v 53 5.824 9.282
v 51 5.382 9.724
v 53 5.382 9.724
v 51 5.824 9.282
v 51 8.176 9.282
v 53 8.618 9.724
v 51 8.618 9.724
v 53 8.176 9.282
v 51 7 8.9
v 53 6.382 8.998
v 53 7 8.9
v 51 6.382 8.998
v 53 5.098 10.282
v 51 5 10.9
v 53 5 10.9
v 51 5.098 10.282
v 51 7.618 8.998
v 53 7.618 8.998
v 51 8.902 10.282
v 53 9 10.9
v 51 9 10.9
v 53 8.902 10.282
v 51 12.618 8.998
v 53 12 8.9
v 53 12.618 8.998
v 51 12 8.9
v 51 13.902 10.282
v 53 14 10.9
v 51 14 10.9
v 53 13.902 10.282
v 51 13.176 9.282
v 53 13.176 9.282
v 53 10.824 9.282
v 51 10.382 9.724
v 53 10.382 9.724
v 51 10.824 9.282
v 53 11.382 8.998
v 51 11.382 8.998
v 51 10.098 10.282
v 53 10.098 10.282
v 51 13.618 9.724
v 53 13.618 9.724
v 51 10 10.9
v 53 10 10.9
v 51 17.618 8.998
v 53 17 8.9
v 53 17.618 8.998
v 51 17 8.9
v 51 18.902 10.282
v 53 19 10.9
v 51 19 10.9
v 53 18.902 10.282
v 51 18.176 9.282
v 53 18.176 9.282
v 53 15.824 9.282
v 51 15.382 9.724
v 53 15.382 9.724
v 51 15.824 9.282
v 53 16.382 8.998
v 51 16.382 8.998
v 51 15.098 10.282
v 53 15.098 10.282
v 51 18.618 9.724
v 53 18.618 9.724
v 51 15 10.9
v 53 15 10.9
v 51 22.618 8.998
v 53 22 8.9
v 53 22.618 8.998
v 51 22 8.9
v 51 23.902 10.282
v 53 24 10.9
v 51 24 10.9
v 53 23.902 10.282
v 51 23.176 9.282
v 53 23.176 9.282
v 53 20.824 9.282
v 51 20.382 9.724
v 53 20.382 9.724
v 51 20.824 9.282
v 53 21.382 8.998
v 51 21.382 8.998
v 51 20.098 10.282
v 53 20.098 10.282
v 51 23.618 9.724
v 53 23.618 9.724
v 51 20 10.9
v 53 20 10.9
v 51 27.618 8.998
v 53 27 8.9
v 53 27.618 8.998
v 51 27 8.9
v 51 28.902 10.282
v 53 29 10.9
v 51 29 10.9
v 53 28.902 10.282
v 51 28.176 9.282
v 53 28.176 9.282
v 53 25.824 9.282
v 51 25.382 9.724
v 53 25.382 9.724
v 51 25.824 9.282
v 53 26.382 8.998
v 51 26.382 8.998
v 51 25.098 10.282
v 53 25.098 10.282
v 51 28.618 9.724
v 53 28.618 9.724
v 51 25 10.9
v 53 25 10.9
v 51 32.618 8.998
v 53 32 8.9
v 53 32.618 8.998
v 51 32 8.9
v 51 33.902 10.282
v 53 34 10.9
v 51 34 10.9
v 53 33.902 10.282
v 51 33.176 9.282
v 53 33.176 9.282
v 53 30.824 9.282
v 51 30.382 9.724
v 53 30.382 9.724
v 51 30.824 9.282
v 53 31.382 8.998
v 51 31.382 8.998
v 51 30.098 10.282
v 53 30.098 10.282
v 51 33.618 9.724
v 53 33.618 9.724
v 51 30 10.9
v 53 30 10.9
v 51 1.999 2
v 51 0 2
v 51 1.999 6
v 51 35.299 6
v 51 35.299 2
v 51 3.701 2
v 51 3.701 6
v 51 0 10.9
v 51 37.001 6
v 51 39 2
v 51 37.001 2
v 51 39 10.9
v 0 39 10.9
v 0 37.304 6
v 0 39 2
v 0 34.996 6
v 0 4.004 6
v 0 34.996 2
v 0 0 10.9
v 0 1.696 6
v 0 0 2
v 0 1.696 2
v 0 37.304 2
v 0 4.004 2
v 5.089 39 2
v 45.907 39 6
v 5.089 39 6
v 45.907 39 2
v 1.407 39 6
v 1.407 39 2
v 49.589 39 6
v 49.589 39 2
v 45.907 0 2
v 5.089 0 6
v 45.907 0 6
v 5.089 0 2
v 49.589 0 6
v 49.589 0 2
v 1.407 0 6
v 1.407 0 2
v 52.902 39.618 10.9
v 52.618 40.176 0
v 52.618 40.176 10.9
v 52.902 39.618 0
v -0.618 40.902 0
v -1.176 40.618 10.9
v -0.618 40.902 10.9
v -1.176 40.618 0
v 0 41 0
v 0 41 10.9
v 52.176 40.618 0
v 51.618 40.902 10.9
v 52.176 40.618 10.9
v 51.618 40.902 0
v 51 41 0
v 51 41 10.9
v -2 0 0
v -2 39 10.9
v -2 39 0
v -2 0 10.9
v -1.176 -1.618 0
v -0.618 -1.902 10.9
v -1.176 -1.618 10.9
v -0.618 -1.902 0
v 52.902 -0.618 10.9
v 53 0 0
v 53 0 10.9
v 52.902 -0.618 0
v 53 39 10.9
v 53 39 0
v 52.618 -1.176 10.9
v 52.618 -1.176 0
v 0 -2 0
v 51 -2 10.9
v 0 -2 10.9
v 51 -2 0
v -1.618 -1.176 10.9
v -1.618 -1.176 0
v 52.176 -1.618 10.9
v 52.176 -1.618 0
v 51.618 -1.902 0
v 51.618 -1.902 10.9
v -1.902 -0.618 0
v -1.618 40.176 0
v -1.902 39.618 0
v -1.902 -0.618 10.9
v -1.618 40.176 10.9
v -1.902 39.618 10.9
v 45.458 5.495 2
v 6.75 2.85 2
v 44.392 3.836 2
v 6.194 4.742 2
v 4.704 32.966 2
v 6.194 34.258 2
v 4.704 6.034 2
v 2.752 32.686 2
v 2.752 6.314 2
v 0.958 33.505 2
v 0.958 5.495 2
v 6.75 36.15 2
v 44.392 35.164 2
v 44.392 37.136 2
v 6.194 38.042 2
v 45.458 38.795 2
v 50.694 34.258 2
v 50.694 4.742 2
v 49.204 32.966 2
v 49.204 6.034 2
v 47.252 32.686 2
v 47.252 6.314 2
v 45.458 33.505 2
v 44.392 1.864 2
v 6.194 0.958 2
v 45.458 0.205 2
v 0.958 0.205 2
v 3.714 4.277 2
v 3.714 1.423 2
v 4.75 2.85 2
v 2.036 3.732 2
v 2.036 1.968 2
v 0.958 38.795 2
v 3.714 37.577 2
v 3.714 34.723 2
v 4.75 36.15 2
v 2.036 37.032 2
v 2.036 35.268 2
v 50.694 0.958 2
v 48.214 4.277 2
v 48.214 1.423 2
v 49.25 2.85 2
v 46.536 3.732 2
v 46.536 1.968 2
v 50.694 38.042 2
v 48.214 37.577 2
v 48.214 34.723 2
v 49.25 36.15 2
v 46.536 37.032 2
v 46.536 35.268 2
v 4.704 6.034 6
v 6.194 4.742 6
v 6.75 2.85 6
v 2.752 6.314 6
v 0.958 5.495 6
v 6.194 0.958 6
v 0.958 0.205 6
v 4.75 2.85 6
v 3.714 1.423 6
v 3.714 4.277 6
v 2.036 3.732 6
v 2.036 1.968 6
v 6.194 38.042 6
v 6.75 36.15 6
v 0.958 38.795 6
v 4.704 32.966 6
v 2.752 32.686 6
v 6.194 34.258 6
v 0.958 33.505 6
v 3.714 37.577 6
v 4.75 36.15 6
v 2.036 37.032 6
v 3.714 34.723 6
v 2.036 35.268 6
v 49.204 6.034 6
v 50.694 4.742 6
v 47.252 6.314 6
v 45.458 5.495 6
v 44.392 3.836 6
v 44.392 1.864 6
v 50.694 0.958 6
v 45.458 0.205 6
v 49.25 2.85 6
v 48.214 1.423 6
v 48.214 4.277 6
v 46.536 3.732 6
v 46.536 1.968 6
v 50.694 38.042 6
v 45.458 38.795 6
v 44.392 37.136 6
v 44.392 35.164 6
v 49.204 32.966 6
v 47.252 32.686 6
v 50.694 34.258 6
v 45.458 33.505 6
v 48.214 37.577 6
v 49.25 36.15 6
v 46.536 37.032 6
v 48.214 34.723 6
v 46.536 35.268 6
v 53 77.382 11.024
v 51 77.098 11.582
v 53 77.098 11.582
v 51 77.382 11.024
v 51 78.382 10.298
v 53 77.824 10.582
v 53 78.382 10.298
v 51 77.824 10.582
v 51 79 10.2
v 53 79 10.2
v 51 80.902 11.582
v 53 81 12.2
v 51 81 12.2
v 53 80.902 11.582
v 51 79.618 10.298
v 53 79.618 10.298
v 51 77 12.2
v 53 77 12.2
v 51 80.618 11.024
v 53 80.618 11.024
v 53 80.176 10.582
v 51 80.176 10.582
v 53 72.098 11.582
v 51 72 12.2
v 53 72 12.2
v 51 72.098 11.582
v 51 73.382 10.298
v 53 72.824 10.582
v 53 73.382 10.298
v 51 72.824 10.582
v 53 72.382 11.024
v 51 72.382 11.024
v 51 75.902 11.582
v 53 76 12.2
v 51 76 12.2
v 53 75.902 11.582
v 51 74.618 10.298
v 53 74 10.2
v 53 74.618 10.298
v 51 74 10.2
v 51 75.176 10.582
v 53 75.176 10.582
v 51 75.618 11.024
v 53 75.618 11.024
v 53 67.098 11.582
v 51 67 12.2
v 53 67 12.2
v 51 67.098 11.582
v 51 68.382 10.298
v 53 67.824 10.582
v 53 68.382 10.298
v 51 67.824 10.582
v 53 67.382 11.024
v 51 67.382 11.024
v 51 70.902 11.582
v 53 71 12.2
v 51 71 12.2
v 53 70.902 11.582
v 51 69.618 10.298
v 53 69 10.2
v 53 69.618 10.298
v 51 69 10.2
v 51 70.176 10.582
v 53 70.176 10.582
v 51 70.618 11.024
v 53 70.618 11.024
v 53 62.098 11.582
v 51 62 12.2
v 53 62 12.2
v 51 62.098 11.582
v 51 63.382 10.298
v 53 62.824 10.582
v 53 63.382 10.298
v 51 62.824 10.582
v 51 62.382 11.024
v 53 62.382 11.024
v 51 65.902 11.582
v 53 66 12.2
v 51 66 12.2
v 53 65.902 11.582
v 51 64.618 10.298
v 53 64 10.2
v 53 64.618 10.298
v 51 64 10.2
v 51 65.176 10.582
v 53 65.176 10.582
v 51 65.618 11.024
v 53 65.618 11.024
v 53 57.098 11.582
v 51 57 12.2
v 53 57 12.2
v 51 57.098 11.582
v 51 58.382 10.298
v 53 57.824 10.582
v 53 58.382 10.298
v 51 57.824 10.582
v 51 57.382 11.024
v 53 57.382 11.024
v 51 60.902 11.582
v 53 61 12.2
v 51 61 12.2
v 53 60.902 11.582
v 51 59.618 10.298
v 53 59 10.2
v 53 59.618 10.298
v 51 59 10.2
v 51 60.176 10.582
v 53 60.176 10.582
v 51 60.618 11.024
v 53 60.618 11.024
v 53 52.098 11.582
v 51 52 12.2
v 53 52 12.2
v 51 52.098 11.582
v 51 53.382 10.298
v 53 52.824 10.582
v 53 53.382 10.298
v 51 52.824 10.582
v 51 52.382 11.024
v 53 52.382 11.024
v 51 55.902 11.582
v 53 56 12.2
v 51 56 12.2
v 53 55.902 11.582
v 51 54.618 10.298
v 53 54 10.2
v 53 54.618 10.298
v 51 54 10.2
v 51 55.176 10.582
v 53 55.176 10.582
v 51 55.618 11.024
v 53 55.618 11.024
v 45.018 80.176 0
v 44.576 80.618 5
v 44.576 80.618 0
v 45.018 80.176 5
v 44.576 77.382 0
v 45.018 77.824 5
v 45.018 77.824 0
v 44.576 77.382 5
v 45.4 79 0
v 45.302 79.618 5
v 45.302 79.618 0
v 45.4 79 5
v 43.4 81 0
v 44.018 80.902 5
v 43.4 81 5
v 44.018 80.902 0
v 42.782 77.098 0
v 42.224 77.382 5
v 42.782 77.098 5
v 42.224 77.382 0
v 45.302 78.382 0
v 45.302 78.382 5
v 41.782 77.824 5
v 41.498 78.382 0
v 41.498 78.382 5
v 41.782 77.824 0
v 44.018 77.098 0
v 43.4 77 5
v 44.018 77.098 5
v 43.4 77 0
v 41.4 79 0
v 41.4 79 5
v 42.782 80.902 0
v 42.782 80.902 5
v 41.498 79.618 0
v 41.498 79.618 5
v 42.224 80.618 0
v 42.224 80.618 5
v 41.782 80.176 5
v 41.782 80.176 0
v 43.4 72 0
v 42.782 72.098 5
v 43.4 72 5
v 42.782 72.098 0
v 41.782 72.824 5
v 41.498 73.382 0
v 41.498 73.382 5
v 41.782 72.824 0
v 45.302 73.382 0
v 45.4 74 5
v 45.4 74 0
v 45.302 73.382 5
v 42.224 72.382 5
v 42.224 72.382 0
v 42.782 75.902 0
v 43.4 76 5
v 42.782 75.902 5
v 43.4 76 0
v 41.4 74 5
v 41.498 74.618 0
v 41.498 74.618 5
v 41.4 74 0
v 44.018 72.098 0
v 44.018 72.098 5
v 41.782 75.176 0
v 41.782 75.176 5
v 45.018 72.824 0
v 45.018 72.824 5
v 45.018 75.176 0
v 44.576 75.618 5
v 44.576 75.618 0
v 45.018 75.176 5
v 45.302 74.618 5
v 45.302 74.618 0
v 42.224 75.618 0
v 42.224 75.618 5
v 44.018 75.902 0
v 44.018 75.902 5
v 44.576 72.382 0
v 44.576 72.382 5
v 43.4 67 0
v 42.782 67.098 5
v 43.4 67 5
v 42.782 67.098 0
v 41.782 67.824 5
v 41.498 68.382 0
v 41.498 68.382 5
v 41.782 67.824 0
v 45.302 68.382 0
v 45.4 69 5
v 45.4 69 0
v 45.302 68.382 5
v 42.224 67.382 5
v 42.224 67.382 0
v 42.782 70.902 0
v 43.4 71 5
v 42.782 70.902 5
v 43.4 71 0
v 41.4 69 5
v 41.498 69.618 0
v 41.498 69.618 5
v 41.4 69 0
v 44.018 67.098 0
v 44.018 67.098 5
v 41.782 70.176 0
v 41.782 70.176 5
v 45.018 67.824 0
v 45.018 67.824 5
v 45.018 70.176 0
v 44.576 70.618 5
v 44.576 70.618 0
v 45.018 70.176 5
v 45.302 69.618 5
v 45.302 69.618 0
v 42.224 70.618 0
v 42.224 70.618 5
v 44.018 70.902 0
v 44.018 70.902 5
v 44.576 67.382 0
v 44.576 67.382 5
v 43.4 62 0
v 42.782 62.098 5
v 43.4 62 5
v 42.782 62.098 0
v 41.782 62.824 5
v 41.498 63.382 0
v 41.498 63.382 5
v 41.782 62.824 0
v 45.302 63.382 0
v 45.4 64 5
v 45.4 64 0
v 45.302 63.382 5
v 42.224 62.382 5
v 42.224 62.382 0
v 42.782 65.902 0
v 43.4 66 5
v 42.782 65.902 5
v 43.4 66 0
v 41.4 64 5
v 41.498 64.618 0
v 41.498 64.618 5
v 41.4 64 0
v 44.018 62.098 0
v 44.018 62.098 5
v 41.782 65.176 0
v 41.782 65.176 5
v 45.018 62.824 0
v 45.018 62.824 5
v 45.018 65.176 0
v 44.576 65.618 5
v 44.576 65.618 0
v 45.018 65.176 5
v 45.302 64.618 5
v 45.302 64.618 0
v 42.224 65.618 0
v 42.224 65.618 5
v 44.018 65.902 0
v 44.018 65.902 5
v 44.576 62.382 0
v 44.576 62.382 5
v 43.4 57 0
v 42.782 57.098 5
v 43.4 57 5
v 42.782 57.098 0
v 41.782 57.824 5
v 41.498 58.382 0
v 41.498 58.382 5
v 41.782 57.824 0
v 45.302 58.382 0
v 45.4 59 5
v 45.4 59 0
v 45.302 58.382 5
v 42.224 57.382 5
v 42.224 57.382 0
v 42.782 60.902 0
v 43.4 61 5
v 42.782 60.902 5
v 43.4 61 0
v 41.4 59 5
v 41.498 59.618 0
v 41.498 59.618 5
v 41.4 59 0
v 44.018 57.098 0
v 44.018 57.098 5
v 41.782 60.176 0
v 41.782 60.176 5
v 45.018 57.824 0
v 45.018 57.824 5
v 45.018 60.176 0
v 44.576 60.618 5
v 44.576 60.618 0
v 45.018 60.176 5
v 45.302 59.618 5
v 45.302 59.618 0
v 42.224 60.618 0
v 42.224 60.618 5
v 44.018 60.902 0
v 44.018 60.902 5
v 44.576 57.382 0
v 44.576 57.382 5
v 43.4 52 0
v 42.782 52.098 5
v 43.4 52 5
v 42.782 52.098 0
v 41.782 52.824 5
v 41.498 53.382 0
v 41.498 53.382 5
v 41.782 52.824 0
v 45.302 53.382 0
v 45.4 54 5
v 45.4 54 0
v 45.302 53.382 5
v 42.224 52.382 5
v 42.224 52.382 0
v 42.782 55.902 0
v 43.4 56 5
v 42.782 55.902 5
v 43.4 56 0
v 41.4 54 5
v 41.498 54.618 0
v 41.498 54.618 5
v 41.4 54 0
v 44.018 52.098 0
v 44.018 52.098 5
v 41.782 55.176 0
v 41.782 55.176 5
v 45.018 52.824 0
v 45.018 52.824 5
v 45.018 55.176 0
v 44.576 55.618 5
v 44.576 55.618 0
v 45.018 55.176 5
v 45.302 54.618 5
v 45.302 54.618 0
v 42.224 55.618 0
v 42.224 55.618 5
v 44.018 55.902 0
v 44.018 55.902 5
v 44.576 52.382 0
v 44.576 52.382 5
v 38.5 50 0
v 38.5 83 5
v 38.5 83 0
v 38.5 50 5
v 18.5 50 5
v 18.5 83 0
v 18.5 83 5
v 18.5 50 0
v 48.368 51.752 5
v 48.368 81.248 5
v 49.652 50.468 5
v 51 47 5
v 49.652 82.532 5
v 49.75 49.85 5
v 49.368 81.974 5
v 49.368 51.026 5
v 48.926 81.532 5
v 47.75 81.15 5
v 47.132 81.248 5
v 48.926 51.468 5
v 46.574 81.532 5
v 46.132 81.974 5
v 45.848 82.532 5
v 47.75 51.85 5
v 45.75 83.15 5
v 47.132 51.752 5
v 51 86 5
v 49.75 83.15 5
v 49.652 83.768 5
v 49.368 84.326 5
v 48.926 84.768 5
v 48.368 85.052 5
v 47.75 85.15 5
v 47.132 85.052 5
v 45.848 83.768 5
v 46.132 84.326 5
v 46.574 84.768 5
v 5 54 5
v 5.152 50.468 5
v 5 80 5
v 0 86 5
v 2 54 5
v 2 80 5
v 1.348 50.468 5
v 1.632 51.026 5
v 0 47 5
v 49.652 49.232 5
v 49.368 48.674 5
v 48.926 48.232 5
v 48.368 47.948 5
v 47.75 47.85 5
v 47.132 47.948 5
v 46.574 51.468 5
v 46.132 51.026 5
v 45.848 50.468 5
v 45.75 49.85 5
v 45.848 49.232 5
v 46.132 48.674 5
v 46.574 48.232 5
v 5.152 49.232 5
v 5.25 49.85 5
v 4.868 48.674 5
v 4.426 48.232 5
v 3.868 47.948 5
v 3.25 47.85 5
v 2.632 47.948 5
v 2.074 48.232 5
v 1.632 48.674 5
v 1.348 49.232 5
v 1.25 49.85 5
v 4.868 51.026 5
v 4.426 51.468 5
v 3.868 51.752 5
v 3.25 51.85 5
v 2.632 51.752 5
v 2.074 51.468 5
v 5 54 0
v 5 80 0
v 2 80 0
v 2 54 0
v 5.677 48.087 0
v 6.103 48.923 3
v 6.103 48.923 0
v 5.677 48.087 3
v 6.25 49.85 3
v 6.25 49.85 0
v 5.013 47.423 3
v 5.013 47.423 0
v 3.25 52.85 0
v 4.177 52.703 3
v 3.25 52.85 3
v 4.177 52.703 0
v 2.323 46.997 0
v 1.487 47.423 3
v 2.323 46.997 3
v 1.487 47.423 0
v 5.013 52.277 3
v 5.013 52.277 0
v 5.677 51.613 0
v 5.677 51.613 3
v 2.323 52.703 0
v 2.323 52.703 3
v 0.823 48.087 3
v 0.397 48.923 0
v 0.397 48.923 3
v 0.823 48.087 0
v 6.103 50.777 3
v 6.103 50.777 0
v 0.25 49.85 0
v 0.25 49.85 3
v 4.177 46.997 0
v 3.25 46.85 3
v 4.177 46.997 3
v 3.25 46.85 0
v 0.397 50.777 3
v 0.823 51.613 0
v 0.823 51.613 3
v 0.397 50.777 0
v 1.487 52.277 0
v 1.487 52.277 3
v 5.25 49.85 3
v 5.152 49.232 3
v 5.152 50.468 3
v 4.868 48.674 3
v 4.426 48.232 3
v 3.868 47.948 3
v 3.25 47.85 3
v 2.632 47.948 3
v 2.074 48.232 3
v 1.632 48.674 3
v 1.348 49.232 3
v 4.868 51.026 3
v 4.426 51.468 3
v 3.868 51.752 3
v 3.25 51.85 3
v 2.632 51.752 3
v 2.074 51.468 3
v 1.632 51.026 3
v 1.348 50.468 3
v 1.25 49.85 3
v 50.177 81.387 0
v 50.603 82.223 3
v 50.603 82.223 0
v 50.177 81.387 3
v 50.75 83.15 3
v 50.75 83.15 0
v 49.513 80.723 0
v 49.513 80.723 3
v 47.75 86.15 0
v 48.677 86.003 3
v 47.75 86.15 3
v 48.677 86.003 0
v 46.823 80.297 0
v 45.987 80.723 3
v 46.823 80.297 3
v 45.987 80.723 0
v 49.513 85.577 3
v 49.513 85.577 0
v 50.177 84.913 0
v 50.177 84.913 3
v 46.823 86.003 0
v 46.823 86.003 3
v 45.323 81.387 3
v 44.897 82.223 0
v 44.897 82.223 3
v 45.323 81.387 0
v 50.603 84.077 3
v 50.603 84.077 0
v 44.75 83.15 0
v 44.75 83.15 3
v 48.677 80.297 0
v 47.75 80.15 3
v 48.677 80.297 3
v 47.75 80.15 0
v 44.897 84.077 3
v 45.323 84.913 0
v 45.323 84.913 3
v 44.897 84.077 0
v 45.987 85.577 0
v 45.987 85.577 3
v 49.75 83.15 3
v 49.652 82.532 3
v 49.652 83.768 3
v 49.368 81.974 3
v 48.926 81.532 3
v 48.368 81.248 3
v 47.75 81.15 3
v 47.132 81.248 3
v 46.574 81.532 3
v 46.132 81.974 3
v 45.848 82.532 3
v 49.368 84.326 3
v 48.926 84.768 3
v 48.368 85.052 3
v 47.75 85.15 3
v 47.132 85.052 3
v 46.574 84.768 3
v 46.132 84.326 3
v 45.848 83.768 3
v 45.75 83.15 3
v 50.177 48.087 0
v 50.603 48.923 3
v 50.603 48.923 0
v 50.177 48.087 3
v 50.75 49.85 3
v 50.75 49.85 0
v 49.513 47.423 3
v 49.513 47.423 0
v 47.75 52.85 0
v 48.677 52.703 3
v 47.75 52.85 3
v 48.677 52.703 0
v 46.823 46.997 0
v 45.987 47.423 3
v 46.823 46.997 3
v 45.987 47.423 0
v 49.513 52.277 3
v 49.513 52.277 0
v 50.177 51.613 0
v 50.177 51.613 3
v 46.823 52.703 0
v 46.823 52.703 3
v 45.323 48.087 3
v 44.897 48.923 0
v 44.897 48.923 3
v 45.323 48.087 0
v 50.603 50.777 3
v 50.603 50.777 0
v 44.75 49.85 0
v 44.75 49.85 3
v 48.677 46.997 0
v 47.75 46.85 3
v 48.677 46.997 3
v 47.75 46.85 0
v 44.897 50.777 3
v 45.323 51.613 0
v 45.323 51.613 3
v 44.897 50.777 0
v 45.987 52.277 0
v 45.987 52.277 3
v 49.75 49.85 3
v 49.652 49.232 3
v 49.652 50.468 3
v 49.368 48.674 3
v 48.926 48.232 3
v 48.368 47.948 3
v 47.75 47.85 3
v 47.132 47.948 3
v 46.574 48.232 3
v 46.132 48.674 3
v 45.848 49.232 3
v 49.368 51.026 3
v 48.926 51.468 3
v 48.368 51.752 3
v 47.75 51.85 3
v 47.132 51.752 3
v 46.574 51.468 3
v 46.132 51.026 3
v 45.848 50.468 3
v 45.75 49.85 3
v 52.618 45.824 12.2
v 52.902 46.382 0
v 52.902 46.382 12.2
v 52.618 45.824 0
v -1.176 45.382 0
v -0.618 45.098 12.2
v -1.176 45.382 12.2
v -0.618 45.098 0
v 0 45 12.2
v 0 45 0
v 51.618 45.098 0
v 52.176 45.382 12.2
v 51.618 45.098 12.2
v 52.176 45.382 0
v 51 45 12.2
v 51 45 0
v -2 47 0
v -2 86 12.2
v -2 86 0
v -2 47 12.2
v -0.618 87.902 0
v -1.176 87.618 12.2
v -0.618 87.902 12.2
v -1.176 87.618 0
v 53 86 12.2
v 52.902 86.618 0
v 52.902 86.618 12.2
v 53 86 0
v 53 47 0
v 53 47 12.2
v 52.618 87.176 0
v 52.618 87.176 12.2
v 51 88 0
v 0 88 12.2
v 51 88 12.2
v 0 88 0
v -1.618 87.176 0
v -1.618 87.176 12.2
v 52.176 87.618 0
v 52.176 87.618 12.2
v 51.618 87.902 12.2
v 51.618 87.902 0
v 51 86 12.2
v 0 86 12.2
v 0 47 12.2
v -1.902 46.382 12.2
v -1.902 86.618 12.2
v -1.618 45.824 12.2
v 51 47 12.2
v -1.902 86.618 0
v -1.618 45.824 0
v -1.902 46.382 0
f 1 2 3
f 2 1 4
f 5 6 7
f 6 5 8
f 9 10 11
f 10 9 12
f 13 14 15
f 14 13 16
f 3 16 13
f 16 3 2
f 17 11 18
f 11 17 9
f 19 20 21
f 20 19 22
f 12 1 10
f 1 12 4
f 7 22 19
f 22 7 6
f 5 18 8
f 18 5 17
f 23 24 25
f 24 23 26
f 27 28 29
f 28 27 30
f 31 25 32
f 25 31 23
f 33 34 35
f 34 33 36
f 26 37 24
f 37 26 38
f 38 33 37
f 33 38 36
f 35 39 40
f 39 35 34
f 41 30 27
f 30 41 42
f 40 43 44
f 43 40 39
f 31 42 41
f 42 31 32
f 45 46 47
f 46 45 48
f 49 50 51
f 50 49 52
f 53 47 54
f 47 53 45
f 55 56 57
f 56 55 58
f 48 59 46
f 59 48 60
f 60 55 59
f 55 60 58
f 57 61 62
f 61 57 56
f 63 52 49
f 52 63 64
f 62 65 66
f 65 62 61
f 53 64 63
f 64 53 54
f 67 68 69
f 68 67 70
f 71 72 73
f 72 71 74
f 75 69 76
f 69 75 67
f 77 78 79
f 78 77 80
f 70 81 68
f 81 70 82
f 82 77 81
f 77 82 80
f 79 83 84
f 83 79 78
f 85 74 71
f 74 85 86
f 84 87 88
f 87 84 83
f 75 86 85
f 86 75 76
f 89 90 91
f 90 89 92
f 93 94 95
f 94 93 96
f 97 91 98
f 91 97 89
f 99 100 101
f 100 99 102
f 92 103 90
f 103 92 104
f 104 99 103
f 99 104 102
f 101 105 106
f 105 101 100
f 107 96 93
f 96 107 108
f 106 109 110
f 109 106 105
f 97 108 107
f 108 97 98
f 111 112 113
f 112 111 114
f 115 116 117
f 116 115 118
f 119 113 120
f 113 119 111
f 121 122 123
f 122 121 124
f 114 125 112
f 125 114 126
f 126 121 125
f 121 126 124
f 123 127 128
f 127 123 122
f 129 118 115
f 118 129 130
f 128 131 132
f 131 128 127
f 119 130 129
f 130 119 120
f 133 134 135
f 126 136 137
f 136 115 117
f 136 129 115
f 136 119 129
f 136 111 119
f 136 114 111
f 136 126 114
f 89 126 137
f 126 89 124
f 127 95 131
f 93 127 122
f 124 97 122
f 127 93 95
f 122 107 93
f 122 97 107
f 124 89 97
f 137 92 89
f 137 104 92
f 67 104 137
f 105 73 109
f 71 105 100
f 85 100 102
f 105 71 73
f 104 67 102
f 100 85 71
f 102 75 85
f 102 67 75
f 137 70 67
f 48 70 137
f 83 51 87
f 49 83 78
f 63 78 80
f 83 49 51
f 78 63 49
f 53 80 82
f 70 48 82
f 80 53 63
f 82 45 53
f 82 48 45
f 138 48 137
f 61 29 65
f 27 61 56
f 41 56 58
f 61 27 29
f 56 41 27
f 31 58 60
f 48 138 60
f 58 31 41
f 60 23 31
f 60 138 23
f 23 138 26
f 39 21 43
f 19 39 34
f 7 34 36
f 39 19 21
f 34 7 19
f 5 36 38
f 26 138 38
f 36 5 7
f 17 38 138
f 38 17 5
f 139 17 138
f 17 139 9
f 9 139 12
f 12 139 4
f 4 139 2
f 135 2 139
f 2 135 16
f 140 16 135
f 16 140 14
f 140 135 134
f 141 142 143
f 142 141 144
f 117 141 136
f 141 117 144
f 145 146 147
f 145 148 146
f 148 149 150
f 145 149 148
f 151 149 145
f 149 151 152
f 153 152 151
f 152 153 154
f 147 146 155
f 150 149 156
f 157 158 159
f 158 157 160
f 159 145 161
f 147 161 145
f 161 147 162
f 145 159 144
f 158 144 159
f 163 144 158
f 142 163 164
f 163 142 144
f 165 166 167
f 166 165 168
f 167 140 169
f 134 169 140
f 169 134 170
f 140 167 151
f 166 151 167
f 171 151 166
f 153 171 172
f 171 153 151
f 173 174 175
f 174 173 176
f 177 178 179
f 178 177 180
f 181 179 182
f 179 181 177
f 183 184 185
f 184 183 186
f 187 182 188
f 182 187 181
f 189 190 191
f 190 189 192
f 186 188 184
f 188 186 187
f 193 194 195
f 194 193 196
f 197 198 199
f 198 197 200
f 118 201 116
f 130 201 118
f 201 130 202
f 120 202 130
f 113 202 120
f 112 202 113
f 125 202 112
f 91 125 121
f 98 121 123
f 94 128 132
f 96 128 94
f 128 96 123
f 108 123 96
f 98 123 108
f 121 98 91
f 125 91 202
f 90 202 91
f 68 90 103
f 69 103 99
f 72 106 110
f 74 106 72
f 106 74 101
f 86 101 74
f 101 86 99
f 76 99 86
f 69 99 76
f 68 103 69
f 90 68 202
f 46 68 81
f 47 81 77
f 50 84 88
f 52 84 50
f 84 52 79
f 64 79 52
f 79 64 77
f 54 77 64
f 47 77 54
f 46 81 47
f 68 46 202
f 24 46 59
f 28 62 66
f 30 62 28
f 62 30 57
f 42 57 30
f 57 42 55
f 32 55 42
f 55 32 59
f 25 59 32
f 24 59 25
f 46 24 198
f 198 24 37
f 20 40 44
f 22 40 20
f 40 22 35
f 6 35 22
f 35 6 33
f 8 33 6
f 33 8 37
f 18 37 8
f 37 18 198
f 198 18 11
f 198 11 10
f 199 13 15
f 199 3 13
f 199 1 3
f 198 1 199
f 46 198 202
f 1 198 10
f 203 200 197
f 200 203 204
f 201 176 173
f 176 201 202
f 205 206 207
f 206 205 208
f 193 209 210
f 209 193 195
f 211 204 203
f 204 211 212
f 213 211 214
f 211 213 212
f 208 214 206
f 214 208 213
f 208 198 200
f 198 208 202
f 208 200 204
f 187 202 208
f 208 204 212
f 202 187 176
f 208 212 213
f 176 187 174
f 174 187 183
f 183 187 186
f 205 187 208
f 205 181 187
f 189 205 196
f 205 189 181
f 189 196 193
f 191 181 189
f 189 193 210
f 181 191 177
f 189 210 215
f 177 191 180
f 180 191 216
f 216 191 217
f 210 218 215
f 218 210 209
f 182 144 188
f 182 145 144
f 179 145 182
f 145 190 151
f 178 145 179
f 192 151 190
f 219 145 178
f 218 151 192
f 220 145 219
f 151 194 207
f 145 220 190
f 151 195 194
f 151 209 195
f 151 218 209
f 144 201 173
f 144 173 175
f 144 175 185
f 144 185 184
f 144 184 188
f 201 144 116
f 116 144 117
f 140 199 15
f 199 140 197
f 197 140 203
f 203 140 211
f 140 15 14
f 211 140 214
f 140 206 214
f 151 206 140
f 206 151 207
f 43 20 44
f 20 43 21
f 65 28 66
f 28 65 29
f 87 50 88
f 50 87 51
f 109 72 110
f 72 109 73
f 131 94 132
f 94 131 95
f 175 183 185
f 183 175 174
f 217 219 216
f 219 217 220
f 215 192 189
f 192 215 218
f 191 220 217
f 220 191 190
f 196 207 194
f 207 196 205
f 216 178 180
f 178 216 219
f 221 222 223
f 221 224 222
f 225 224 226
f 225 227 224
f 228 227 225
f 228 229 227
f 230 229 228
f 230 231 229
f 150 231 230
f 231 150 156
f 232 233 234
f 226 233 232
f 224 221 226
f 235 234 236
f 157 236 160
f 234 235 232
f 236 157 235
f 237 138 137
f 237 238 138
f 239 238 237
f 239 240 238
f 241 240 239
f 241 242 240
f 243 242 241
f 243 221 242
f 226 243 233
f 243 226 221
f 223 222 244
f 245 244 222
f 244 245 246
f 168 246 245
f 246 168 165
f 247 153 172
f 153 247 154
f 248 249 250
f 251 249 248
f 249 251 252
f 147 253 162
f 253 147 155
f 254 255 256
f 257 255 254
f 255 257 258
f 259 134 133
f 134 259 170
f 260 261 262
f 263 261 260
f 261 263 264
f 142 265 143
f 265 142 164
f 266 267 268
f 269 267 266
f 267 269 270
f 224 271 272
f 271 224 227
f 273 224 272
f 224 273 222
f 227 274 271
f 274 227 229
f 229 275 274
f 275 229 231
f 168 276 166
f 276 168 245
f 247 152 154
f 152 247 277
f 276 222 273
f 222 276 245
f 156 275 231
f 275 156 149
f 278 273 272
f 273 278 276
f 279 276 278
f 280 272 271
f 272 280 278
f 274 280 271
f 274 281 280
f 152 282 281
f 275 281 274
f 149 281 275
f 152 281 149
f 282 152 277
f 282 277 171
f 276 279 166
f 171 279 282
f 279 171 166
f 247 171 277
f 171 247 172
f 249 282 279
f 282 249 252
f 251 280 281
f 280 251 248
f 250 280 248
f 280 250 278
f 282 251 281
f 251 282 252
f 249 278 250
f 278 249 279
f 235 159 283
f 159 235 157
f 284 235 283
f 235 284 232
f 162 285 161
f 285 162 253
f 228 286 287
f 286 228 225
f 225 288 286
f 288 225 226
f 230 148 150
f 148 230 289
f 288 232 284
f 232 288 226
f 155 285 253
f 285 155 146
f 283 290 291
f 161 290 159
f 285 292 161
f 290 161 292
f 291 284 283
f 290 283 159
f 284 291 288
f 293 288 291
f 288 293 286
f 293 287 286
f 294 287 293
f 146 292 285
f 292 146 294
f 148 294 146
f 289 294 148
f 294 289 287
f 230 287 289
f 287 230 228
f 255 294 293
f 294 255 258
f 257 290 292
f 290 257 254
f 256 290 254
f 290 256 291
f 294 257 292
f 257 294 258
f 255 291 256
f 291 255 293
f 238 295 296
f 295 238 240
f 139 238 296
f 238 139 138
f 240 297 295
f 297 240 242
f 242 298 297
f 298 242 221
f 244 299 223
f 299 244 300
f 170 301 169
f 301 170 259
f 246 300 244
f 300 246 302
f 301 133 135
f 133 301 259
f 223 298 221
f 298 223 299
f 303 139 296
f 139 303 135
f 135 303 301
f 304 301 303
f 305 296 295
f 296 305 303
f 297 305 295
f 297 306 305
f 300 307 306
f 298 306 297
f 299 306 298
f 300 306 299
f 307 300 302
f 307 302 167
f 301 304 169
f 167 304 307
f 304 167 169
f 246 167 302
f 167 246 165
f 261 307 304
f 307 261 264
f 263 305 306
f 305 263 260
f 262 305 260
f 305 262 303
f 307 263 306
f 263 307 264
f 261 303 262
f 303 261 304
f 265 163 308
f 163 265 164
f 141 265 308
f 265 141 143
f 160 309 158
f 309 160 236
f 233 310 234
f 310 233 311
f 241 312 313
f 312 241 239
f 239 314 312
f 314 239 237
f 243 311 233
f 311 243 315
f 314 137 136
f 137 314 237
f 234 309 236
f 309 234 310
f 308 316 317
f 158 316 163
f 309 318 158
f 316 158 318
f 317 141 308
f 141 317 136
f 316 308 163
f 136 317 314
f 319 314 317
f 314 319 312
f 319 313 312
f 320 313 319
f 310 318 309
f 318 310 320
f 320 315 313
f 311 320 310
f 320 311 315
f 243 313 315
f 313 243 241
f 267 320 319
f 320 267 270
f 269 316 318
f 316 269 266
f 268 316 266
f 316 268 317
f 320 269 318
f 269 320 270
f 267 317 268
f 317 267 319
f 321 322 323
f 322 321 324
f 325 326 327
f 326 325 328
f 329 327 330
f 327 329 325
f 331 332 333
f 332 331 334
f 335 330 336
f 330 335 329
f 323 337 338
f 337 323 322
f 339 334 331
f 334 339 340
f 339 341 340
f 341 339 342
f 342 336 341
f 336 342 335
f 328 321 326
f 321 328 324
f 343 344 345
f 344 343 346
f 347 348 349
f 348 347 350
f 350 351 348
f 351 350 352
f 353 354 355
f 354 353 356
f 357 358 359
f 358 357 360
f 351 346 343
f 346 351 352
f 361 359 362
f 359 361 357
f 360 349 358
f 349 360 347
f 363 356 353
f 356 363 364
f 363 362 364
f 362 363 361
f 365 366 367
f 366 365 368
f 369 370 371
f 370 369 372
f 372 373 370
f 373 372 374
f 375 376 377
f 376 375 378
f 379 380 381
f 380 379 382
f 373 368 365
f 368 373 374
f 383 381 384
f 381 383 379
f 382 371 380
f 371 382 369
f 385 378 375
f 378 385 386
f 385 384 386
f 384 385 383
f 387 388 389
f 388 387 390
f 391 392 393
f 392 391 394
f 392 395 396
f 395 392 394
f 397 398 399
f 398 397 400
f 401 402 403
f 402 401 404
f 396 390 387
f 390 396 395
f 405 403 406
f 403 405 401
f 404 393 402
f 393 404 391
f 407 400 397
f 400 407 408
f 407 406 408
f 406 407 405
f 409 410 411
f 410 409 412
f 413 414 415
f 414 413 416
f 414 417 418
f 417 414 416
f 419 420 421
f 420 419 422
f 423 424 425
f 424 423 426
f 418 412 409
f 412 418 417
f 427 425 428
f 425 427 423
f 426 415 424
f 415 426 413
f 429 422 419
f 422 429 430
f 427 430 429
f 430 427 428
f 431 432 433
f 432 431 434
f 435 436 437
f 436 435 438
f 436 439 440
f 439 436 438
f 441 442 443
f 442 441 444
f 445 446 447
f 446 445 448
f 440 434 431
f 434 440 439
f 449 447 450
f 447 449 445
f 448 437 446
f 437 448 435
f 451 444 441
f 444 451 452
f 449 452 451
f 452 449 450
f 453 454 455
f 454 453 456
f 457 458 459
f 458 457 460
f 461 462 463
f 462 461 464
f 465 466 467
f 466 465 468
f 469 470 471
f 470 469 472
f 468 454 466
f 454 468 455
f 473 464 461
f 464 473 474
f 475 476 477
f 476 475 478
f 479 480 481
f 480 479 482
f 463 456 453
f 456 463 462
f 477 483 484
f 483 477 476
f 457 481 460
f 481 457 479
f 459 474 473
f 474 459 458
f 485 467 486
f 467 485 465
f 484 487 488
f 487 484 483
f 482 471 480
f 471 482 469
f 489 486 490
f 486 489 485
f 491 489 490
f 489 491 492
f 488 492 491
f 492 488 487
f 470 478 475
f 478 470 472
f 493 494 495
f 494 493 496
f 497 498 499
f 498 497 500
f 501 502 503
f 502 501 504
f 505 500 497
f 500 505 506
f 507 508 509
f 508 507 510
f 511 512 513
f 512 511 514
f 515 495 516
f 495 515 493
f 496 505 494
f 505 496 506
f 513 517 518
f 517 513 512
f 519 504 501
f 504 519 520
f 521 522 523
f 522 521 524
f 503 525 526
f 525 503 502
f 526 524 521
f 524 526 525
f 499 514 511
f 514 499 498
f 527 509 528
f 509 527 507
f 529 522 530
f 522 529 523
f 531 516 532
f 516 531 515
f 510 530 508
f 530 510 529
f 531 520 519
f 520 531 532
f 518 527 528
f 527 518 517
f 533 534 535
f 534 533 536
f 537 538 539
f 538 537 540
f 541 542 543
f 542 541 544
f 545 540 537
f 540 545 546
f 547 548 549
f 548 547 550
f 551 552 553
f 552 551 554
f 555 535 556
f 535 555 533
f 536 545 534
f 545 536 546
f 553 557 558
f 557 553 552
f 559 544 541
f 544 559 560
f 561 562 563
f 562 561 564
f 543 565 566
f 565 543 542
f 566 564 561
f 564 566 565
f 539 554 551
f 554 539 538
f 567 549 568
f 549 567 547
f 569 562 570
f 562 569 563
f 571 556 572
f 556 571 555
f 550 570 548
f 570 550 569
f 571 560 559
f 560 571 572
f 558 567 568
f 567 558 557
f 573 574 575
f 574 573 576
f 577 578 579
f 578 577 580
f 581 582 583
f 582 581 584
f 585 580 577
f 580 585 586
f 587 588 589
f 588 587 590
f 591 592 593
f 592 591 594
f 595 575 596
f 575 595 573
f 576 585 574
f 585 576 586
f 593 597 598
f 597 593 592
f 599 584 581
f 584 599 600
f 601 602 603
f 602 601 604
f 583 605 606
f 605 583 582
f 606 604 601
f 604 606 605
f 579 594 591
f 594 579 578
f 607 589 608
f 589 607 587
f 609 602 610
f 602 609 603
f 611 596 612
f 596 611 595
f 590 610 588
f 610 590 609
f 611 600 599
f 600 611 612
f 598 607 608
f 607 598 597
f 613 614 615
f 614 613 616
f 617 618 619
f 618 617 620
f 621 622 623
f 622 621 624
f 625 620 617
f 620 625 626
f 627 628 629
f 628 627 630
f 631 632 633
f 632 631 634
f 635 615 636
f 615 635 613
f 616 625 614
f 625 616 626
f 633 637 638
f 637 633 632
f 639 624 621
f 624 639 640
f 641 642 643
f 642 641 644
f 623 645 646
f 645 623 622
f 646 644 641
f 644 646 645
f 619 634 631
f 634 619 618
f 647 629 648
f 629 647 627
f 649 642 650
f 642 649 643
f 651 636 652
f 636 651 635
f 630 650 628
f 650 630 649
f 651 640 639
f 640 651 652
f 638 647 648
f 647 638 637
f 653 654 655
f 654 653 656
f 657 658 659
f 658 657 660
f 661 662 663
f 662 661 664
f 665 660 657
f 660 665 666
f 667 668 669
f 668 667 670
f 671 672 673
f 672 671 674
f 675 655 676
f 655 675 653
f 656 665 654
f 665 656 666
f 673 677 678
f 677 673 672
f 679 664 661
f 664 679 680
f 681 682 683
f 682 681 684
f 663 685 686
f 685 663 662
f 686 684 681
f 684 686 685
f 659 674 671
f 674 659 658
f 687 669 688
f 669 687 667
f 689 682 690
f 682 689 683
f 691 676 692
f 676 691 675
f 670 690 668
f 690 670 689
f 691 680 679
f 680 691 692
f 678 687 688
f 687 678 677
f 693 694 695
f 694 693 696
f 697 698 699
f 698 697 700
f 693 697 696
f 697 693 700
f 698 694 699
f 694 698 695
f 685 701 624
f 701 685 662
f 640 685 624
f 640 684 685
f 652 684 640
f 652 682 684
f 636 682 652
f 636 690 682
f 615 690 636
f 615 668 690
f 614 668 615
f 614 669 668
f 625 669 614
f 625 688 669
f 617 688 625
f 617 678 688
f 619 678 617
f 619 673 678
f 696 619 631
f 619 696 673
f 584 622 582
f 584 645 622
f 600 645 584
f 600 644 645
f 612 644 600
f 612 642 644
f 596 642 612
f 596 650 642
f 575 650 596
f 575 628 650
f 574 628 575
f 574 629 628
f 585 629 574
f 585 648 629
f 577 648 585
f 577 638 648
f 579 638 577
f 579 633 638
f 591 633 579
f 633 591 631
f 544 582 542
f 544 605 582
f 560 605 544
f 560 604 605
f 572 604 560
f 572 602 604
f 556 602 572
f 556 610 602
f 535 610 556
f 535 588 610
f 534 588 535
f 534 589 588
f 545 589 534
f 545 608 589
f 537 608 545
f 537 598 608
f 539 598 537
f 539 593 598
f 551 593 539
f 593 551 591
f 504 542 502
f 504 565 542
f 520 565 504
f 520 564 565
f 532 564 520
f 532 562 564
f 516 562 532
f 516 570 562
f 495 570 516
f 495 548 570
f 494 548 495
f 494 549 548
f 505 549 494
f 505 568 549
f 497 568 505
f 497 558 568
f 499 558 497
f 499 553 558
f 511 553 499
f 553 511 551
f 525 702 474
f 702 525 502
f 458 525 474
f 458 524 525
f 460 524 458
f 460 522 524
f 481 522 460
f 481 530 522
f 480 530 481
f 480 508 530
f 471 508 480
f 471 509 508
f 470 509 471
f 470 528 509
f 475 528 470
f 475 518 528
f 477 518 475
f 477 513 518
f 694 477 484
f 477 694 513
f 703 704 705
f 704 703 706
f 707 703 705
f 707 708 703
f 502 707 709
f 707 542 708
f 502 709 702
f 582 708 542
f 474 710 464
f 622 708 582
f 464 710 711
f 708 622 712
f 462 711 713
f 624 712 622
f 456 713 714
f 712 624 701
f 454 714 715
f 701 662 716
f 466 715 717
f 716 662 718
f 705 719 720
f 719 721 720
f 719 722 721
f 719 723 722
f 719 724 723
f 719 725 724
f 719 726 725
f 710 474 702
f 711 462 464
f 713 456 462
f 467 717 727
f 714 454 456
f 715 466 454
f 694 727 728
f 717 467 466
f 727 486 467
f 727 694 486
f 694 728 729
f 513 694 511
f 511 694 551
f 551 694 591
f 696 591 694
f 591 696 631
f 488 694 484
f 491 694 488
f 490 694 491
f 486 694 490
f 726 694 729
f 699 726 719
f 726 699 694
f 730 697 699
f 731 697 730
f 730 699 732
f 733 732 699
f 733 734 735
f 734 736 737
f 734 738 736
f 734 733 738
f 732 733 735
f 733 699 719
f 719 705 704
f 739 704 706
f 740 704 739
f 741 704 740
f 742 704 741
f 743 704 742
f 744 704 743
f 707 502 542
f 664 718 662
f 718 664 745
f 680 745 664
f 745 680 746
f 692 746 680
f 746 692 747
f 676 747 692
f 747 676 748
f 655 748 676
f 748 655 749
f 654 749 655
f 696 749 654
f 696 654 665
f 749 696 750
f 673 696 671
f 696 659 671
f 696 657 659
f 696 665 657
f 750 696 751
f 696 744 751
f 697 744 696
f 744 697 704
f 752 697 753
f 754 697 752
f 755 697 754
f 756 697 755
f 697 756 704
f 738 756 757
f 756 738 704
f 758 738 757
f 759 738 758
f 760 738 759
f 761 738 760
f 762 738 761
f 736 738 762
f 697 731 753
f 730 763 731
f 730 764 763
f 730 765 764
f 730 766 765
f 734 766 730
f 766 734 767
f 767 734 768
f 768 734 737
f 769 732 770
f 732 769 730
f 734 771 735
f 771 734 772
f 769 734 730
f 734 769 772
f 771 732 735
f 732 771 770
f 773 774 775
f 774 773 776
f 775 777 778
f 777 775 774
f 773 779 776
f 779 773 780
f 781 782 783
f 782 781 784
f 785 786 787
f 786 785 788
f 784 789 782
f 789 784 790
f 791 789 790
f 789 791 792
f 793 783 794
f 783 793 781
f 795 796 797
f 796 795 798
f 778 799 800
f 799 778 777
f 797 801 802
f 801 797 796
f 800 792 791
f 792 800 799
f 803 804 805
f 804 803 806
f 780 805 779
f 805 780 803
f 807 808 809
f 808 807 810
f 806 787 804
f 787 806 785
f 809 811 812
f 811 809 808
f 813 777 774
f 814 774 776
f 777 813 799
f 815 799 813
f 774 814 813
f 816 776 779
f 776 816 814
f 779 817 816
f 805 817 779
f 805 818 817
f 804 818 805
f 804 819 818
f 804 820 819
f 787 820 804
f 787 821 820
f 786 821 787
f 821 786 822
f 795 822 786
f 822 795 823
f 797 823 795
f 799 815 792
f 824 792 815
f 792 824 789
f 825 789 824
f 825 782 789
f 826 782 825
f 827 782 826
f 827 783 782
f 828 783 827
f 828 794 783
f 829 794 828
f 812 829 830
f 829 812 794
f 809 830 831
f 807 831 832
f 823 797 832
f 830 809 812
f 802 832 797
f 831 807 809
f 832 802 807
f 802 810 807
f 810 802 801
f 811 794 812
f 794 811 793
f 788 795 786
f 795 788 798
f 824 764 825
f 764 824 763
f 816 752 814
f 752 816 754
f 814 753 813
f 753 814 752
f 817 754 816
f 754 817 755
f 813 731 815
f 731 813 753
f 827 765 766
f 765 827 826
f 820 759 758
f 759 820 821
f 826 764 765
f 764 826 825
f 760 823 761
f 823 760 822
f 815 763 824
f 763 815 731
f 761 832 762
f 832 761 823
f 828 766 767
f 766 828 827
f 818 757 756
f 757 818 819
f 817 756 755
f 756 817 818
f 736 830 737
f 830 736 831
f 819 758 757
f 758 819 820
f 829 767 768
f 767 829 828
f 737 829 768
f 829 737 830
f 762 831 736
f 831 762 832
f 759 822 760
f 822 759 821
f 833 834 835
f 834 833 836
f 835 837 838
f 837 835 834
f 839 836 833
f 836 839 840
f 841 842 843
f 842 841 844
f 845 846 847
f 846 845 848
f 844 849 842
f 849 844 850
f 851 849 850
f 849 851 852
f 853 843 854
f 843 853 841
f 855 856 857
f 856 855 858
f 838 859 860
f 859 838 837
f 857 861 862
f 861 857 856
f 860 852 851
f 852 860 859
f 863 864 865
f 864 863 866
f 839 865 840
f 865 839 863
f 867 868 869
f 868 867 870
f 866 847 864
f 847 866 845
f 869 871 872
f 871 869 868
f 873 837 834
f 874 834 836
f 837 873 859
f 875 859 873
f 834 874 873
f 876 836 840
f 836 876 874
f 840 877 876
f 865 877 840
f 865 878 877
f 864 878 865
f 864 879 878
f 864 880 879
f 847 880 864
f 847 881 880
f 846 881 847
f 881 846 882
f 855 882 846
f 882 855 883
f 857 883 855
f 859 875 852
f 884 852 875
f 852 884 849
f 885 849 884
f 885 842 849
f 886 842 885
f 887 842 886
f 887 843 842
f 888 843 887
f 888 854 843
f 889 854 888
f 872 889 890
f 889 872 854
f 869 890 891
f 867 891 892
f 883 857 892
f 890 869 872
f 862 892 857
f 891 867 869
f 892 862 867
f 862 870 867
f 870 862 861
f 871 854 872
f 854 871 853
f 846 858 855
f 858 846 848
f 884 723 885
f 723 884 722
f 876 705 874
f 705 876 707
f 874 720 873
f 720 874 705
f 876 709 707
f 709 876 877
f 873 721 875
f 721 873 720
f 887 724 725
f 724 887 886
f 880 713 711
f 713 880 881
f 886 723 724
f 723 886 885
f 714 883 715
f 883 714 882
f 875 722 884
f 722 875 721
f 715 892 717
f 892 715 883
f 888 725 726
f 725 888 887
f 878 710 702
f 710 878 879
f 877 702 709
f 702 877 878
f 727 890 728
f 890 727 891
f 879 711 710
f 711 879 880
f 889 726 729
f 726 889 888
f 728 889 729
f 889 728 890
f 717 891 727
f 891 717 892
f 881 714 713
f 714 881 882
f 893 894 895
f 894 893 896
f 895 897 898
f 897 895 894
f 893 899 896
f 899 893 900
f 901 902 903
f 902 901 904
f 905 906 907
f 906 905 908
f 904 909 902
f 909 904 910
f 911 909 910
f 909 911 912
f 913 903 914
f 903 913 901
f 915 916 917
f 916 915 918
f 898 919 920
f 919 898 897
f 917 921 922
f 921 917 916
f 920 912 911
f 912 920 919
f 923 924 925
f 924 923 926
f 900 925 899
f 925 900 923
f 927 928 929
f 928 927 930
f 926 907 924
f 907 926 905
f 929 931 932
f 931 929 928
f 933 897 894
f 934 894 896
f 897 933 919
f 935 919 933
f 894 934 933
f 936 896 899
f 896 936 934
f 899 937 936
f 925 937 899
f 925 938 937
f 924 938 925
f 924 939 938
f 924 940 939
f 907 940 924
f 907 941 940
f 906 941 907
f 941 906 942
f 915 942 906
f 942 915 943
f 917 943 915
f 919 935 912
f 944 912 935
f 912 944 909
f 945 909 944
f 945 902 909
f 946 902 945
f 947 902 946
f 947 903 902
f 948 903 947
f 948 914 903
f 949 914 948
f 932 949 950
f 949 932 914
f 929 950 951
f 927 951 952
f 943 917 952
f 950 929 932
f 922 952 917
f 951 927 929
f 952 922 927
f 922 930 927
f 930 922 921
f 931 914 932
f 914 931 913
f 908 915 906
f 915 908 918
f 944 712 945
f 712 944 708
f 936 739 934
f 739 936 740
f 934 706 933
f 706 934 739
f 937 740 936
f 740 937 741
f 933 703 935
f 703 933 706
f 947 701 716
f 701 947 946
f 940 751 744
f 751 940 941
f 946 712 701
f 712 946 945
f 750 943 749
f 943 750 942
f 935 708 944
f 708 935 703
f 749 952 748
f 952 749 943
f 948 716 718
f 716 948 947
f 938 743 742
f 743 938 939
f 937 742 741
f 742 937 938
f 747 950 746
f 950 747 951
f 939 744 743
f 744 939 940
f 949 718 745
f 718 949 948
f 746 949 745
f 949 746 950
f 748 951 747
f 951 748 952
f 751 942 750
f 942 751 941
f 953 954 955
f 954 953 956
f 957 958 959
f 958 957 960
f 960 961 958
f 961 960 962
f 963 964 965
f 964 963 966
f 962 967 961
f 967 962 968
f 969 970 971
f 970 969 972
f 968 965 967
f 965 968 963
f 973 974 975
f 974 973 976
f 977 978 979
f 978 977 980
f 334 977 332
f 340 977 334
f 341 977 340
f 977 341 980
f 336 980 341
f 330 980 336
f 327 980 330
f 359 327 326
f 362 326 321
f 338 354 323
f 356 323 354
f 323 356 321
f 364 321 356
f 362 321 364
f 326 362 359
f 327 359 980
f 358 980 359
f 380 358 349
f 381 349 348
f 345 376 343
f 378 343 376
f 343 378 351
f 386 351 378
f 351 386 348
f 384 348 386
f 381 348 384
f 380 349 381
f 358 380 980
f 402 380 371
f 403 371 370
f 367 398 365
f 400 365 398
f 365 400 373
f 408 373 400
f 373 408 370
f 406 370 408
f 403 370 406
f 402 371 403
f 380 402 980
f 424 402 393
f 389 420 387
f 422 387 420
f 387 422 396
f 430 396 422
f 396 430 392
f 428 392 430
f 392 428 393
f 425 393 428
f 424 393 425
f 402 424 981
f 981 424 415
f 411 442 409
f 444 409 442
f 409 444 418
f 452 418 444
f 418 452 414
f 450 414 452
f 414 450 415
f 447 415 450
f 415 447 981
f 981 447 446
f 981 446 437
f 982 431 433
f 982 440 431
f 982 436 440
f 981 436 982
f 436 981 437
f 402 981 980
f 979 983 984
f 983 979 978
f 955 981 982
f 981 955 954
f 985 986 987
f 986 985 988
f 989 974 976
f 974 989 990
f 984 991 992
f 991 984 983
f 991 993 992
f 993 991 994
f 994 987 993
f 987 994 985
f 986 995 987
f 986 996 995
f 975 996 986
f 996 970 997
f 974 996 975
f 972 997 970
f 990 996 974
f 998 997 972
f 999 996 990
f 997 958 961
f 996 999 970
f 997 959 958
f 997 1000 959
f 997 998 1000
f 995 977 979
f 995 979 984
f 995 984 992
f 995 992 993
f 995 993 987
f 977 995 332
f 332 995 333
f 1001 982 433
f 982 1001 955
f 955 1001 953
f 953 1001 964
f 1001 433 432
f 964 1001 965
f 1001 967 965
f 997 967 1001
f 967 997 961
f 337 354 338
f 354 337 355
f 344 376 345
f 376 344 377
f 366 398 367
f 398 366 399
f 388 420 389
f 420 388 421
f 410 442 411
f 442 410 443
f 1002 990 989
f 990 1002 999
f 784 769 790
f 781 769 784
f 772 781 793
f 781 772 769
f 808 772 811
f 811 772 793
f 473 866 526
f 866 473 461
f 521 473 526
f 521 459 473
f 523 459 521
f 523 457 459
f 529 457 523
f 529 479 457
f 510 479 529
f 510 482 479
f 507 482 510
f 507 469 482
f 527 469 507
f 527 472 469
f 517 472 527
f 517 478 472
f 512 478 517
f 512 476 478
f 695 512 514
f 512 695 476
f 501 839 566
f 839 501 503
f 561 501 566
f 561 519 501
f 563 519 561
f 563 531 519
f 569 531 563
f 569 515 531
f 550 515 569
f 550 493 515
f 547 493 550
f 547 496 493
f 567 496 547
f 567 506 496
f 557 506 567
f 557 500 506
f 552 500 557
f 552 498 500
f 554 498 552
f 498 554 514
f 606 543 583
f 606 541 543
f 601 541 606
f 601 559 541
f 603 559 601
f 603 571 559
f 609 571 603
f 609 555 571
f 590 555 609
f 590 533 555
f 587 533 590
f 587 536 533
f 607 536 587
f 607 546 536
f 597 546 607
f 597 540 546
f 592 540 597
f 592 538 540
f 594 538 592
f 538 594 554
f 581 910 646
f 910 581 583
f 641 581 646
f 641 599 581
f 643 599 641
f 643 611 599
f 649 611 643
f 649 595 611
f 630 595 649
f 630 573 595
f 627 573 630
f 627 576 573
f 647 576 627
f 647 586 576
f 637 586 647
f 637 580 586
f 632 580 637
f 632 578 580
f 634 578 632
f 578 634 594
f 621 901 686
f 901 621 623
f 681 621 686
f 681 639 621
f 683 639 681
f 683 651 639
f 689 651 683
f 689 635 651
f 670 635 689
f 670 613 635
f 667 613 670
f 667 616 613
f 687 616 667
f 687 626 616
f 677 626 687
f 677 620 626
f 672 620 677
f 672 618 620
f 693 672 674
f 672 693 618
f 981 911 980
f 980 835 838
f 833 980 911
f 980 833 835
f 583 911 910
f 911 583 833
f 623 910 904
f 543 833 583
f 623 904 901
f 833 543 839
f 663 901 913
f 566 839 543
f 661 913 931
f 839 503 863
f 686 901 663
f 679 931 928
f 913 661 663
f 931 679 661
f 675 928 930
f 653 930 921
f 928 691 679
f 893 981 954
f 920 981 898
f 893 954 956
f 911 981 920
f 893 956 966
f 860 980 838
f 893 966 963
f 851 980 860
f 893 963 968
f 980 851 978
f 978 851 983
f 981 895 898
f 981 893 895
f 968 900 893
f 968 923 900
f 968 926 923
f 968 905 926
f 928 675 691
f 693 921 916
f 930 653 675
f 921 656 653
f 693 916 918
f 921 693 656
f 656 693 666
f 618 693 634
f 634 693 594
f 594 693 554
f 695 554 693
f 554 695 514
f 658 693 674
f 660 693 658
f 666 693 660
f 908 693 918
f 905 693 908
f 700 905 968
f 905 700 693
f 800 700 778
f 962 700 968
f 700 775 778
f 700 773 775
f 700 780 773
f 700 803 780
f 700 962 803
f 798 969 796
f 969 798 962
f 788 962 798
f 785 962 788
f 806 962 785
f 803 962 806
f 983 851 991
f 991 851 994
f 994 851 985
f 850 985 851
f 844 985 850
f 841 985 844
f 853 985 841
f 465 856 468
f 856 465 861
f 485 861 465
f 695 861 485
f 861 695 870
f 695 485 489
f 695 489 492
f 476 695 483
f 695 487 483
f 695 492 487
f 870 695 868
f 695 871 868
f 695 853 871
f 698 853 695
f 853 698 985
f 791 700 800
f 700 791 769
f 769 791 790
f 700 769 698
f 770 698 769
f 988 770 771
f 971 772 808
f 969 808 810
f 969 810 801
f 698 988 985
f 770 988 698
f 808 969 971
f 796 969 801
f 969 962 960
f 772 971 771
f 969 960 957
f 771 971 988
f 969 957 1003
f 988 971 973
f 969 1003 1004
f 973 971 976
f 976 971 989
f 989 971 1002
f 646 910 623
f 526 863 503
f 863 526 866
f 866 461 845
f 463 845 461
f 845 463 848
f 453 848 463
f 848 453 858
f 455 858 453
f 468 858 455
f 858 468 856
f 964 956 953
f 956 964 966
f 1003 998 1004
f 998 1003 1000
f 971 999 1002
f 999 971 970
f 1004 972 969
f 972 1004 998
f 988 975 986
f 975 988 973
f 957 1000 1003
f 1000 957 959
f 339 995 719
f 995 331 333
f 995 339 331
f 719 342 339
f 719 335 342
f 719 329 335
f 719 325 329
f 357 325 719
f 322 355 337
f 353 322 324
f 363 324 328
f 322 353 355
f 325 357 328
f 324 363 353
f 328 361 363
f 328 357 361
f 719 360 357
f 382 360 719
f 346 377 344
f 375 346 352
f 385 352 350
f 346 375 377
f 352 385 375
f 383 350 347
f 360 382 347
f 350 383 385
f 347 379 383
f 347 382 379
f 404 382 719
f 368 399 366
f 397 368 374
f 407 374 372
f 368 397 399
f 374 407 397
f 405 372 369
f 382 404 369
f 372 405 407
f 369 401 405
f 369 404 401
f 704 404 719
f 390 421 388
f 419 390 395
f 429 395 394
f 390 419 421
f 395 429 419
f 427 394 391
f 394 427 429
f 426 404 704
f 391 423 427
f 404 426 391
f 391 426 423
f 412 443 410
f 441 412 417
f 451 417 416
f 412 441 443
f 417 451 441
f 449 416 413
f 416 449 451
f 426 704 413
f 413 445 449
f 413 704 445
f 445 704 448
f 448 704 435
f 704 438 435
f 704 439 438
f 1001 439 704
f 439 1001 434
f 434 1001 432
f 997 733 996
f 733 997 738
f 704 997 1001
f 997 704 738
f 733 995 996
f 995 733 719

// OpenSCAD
pcbL = 51;
pcbW = 39;
pcbH = 1.6;
pcbUnderH = 4;
screwW = 33.3;
screwL = 44.5;
screwD = 3;
boxHfromPcb = 12;
walls = 2;
roundAnglesD = 2*walls;

relaysL = 20;
relaysW = 33;
relaysH = 16;
relaysDeltaX = 19-.5;


module screwMount() {
    difference(){
        cylinder(d=screwD+2*walls, h= pcbUnderH);
        cylinder(d=screwD, h=pcbUnderH);
    }
}

module screwMounts() {
    screwMount();
    translate([0, screwW, 0])
        screwMount();
    translate([screwL, 0, 0]){
        screwMount();
        translate([0, screwW, 0])
            screwMount();
    }
}

module corner(h) {
    cylinder(d=roundAnglesD, h=h, $fn=20);
}

module roundedBox(h) {
    hull() {
        corner(h);
        translate([pcbL, 0, 0])
            corner(h);
        translate([0, pcbW, 0]) {
            corner(h);
            translate([pcbL, 0, 0])
                corner(h);
        }
    }
}

module relays() {
    cube([relaysL, relaysW, relaysH]);
}

screwConnL = 8;
screwConnW = 30;
screwConnH = 10.5;
screwConnDeltaX = 4;

module screwConnectors() {
    cube([screwConnL, screwConnW, screwConnH]);
}

wiresL = 3;
wiresW = 26;
wiresH = 20;
wiresDeltaX = 2;
wiresDeltaY = 6;

module inputWires() {
    cube([wiresL, wiresW, wiresH]);
}

powerWireD = 4;
powerWireL = 10;
powerWireSpace = screwConnW/6;
powerWireH = 3.3;
powerWireDeltaX = 3.6;

module powerWire(){
    cylinder(d=powerWireD, h=powerWireL, $fn=20);
}

module powerWires() {
    for(i=[0:5]) {
        translate([0, i*powerWireSpace, 0])
            rotate([0, 90, 0])
                powerWire();
    }
}

module pcb() {
    union(){
        cube([pcbL, pcbW, pcbH]);
        translate([relaysDeltaX, (pcbW-relaysW)/2, pcbH])
            relays();
        translate([pcbL-screwConnDeltaX-screwConnL, (pcbW-screwConnW)/2, pcbH])
            screwConnectors();
        translate([pcbL-screwConnDeltaX, powerWireSpace/2+(pcbW-screwConnW)/2, pcbH+powerWireH])
            powerWires();
        translate([pcbL-screwConnDeltaX-powerWireDeltaX, powerWireSpace/2+(pcbW-screwConnW)/2, pcbH+screwConnH-.1])
            rotate([0, -90, 0])
            powerWires();
        translate([wiresDeltaX, wiresDeltaY, 0])
            inputWires();
    }
}


bottomH = pcbUnderH+pcbH+walls+powerWireH;

module bottom() {
    union(){
        difference() {
            roundedBox(bottomH);
            translate([0, 0, walls])
                cube([pcbL, pcbW, 10]);
            translate([0, 0, pcbUnderH+walls])
                pcb();
        }
        translate([(pcbL-screwL)/2, (pcbW-screwW)/2, walls])
            screwMounts();
    }
}

counterSinkH = 3;
counterSinkD = 6;

module counterSink(){
    mirror([0, 0, 1]){
        cylinder(d=counterSinkD, h=counterSinkH, $fn=20);
        cylinder(d=screwD+1, h=10, $fn=20);
    }    
}

module counterSinks(){
//    counterSink();
    translate([0, screwW, 0])
        counterSink();
    translate([screwL, 0, 0]){
        counterSink();
        translate([0, screwW, 0])
            counterSink();
    }
}

topH = screwConnH-powerWireH+walls+counterSinkH;

module top(){
    difference(){
        translate([0, 0, bottomH])
            roundedBox(topH);
        cube([pcbL, pcbW, bottomH+screwConnH-powerWireH]);
        translate([0, 0, pcbUnderH+walls])
            pcb();
        translate([(pcbL-screwL)/2, (pcbW-screwW)/2, bottomH+topH])
            counterSinks();
    }
}

bottom();
//top();
%translate([0, 0, pcbUnderH+walls])
    pcb();

translate([0, 2*(pcbW+roundAnglesD), bottomH+topH])
    rotate([180, 0, 0]) 
        top();
